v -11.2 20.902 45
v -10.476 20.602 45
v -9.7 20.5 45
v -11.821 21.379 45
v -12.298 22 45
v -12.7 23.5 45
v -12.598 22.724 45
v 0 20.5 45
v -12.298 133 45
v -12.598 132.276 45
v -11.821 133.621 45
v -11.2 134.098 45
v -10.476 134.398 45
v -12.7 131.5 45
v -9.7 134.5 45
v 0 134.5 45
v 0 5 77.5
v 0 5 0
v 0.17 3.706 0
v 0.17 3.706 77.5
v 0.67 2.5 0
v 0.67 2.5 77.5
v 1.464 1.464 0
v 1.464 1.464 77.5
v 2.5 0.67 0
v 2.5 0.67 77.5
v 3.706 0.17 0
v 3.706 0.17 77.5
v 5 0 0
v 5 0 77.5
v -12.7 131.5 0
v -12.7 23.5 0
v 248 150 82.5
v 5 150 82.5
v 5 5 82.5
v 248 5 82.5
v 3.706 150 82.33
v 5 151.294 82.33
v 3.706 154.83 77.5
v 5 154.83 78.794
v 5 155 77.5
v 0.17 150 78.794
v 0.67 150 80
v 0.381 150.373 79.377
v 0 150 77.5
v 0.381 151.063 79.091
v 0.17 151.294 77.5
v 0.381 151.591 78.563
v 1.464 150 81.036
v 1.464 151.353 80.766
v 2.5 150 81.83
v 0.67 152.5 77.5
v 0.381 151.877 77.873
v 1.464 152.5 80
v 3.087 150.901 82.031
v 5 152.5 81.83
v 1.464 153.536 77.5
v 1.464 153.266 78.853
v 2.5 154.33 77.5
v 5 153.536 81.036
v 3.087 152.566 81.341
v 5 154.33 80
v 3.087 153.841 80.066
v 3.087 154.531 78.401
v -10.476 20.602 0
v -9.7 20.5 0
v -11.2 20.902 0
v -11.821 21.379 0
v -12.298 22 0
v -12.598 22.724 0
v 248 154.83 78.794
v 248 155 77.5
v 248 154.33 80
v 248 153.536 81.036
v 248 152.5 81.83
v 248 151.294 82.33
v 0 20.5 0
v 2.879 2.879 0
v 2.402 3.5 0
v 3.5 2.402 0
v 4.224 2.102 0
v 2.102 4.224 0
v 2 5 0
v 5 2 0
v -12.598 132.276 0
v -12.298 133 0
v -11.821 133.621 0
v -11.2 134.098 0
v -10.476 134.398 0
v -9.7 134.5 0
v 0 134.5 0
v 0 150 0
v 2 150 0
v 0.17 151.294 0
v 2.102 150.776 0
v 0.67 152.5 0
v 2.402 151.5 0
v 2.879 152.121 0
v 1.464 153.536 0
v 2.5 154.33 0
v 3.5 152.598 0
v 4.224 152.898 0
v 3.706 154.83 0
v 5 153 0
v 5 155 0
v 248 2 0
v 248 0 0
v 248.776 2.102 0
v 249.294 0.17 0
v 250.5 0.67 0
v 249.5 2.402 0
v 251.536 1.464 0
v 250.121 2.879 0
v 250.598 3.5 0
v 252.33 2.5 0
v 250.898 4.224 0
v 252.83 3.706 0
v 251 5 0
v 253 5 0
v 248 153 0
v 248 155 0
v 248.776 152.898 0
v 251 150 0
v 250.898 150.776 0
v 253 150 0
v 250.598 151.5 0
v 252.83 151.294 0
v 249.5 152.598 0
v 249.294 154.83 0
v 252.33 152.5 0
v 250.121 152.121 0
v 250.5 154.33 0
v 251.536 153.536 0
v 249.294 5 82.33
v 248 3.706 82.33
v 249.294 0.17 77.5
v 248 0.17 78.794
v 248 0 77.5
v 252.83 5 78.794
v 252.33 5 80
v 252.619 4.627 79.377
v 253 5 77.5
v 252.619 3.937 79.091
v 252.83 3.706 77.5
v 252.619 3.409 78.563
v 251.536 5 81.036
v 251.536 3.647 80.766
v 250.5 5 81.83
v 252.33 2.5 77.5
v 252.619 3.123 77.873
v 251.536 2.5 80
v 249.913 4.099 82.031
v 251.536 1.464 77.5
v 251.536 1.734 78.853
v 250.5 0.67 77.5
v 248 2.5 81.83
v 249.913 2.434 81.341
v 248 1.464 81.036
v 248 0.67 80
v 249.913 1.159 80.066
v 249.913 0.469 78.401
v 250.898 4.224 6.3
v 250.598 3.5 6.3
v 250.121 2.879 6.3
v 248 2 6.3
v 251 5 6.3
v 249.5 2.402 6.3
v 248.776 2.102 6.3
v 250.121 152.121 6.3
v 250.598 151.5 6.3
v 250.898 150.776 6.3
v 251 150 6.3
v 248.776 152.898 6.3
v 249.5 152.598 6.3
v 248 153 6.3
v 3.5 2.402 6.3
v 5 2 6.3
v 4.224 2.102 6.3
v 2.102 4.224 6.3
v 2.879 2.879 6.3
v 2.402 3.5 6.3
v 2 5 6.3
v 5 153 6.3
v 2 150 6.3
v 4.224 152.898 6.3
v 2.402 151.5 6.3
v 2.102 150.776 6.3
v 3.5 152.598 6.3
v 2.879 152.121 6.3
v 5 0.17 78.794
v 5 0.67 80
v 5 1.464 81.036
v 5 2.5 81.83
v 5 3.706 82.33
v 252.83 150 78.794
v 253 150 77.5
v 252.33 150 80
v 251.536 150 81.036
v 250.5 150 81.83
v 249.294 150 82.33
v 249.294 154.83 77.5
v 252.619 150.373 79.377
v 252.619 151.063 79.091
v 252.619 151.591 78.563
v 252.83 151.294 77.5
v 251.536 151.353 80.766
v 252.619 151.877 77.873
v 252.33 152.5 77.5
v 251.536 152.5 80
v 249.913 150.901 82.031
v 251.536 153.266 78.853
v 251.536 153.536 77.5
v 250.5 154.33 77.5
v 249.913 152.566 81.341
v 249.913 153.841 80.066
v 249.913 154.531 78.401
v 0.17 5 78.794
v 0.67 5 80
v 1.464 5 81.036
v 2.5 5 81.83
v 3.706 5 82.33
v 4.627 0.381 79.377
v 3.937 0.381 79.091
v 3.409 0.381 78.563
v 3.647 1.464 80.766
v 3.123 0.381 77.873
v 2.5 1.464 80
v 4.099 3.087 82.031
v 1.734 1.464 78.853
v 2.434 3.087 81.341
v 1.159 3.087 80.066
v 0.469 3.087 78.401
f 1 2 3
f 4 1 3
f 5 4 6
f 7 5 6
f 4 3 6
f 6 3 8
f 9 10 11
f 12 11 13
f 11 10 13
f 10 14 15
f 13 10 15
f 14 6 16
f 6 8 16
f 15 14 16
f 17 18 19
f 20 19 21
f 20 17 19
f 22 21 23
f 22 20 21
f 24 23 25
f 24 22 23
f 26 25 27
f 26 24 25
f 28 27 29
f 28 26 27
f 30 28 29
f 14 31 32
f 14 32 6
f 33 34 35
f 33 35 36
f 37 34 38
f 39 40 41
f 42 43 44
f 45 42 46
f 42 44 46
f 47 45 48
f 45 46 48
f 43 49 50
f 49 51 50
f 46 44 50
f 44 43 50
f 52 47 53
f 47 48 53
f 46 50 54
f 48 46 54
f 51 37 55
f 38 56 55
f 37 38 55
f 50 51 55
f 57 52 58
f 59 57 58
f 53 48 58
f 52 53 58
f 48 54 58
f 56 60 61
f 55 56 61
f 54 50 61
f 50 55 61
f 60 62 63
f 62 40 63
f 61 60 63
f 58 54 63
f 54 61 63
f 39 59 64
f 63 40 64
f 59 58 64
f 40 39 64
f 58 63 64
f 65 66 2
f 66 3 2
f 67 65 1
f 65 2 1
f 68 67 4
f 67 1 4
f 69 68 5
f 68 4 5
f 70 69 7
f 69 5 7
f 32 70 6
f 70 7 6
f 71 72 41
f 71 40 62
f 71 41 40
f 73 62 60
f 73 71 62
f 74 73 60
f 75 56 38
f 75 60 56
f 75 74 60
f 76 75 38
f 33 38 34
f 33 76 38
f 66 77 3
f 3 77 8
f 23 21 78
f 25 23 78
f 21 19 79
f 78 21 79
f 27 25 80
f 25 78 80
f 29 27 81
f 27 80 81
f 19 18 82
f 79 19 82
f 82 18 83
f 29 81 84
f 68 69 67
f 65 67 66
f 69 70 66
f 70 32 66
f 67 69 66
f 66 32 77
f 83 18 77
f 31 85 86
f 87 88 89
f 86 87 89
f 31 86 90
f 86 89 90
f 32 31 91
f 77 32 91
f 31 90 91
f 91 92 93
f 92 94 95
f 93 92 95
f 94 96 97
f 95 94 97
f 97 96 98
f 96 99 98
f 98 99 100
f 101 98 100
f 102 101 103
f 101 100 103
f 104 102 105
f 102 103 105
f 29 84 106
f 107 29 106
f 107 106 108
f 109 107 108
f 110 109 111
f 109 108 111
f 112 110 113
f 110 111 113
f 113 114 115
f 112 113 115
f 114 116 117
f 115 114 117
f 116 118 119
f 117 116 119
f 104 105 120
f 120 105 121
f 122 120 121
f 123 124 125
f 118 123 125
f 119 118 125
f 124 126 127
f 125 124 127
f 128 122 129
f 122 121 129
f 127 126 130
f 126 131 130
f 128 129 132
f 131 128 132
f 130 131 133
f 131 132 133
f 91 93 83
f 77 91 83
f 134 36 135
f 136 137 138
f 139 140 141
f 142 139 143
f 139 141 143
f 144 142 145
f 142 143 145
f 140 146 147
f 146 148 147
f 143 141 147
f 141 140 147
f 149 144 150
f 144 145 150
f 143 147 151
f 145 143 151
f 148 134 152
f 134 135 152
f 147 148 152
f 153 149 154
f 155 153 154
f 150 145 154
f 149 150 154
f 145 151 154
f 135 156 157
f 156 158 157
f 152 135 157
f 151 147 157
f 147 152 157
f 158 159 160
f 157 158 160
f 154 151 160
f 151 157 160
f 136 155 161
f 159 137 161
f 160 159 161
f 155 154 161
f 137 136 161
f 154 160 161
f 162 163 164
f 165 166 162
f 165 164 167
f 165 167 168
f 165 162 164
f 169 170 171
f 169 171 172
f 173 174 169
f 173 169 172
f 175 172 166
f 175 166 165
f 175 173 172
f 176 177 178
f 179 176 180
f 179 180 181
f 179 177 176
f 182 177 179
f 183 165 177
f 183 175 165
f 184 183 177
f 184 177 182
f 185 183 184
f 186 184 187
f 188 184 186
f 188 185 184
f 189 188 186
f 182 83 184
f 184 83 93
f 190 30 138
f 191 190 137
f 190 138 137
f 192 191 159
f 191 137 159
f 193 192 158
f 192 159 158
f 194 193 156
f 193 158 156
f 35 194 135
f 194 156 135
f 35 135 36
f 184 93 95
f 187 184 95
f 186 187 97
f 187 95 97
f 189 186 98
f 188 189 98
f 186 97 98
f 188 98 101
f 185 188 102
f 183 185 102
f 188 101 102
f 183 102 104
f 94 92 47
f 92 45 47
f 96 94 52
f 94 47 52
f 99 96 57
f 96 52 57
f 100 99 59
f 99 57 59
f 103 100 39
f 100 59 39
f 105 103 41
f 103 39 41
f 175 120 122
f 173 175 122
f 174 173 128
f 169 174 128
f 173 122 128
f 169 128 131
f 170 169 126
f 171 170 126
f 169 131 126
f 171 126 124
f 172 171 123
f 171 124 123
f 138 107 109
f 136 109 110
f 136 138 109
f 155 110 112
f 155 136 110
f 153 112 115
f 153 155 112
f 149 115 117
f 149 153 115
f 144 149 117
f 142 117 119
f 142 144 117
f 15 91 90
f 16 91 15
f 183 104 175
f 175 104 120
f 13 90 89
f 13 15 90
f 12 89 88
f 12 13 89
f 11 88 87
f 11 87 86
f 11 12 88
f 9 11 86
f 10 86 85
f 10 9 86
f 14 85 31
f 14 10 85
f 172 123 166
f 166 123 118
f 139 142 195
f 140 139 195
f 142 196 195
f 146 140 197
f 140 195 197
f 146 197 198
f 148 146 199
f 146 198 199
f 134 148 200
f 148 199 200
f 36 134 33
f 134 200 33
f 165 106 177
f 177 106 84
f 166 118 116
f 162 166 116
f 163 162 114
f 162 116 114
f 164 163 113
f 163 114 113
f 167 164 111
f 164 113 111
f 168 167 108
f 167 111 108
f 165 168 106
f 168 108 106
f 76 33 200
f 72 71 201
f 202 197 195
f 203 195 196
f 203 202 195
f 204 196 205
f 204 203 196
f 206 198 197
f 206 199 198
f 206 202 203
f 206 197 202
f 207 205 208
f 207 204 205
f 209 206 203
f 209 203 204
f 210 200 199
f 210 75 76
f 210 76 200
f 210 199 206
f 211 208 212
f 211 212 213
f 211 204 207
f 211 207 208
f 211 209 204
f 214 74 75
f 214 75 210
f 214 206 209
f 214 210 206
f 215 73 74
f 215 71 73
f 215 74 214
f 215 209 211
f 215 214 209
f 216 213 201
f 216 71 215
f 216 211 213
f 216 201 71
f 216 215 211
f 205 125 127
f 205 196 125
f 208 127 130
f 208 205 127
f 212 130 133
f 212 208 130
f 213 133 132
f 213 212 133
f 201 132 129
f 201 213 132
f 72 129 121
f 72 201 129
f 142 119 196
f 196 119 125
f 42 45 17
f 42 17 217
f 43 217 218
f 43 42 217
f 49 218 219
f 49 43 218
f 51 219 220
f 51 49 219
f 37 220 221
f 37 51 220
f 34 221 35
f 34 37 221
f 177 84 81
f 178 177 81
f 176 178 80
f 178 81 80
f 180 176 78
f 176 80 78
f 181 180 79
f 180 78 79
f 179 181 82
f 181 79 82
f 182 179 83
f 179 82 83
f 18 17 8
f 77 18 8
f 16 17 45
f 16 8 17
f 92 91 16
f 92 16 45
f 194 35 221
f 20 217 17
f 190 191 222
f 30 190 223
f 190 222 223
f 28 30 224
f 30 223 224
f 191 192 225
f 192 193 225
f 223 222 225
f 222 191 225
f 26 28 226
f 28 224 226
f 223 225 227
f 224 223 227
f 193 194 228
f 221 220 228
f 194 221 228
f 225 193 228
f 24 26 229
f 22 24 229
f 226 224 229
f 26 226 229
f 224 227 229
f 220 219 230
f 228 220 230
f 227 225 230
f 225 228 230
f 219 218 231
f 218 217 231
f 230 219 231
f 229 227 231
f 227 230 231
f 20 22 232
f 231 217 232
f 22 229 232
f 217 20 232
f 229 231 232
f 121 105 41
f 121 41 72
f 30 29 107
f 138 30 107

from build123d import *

# Parameters (mm, degrees)
SKETCH1_W           = 253
SKETCH1_H           = 155
BOSS_EXTRUDE1_DEPTH = 82.5
FILLET1_R           = 5
CUT_EXTRUDE1_DEPTH  = 6.3
SKETCH5_W           = 45
SKETCH5_H           = 114
BOSS_EXTRUDE2_DEPTH = 12.7
FILLET2_R           = 3


with BuildPart() as part:
    # Sketch1 → Boss-Extrude1 (new body)
    with BuildSketch(Plane.XY):
        with Locations((126.5, 77.5)):
            Rectangle(SKETCH1_W, SKETCH1_H)
    extrude(amount=BOSS_EXTRUDE1_DEPTH)

    # Fillet1
    fillet1_edges = [part.edges().sort_by_distance(p)[0] for p in [
        (126.5, 155, 82.5),
        (0, 77.5, 82.5),
        (126.5, 0, 82.5),
        (253, 77.5, 82.5),
        (0, 0, 41.25),
        (0, 155, 41.25),
        (253, 155, 41.25),
        (253, 0, 41.25),
    ]]
    fillet(fillet1_edges, radius=FILLET1_R)

    # Sketch2 → Cut-Extrude1 (cut)
    with BuildSketch(Plane(origin=(0, 0, 0), x_dir=(-1, 0, 0), z_dir=(0, 0, -1))):
        with BuildLine():
            Line((-2, 5), (-2, 150))
            ThreePointArc((-2, 150), (-2.878679656, 152.121320344), (-5, 153))
            Line((-5, 153), (-248, 153))
            ThreePointArc((-248, 153), (-250.121320344, 152.121320344), (-251, 150))
            Line((-251, 150), (-251, 5))
            ThreePointArc((-251, 5), (-250.121320344, 2.878679656), (-248, 2))
            Line((-248, 2), (-5, 2))
            ThreePointArc((-5, 2), (-2.878679656, 2.878679656), (-2, 5))
        make_face()
    extrude(amount=-CUT_EXTRUDE1_DEPTH, mode=Mode.SUBTRACT)

    # Sketch5 → Boss-Extrude2 (add)
    with BuildSketch(Plane.ZY):
        with Locations((22.5, 77.5)):
            Rectangle(SKETCH5_W, SKETCH5_H)
    extrude(amount=BOSS_EXTRUDE2_DEPTH)

    # Fillet2
    fillet2_edges = [part.edges().sort_by_distance(p)[0] for p in [
        (-12.7, 134.5, 22.5),
        (-12.7, 20.5, 22.5),
    ]]
    fillet(fillet2_edges, radius=FILLET2_R)


solid = part.part
